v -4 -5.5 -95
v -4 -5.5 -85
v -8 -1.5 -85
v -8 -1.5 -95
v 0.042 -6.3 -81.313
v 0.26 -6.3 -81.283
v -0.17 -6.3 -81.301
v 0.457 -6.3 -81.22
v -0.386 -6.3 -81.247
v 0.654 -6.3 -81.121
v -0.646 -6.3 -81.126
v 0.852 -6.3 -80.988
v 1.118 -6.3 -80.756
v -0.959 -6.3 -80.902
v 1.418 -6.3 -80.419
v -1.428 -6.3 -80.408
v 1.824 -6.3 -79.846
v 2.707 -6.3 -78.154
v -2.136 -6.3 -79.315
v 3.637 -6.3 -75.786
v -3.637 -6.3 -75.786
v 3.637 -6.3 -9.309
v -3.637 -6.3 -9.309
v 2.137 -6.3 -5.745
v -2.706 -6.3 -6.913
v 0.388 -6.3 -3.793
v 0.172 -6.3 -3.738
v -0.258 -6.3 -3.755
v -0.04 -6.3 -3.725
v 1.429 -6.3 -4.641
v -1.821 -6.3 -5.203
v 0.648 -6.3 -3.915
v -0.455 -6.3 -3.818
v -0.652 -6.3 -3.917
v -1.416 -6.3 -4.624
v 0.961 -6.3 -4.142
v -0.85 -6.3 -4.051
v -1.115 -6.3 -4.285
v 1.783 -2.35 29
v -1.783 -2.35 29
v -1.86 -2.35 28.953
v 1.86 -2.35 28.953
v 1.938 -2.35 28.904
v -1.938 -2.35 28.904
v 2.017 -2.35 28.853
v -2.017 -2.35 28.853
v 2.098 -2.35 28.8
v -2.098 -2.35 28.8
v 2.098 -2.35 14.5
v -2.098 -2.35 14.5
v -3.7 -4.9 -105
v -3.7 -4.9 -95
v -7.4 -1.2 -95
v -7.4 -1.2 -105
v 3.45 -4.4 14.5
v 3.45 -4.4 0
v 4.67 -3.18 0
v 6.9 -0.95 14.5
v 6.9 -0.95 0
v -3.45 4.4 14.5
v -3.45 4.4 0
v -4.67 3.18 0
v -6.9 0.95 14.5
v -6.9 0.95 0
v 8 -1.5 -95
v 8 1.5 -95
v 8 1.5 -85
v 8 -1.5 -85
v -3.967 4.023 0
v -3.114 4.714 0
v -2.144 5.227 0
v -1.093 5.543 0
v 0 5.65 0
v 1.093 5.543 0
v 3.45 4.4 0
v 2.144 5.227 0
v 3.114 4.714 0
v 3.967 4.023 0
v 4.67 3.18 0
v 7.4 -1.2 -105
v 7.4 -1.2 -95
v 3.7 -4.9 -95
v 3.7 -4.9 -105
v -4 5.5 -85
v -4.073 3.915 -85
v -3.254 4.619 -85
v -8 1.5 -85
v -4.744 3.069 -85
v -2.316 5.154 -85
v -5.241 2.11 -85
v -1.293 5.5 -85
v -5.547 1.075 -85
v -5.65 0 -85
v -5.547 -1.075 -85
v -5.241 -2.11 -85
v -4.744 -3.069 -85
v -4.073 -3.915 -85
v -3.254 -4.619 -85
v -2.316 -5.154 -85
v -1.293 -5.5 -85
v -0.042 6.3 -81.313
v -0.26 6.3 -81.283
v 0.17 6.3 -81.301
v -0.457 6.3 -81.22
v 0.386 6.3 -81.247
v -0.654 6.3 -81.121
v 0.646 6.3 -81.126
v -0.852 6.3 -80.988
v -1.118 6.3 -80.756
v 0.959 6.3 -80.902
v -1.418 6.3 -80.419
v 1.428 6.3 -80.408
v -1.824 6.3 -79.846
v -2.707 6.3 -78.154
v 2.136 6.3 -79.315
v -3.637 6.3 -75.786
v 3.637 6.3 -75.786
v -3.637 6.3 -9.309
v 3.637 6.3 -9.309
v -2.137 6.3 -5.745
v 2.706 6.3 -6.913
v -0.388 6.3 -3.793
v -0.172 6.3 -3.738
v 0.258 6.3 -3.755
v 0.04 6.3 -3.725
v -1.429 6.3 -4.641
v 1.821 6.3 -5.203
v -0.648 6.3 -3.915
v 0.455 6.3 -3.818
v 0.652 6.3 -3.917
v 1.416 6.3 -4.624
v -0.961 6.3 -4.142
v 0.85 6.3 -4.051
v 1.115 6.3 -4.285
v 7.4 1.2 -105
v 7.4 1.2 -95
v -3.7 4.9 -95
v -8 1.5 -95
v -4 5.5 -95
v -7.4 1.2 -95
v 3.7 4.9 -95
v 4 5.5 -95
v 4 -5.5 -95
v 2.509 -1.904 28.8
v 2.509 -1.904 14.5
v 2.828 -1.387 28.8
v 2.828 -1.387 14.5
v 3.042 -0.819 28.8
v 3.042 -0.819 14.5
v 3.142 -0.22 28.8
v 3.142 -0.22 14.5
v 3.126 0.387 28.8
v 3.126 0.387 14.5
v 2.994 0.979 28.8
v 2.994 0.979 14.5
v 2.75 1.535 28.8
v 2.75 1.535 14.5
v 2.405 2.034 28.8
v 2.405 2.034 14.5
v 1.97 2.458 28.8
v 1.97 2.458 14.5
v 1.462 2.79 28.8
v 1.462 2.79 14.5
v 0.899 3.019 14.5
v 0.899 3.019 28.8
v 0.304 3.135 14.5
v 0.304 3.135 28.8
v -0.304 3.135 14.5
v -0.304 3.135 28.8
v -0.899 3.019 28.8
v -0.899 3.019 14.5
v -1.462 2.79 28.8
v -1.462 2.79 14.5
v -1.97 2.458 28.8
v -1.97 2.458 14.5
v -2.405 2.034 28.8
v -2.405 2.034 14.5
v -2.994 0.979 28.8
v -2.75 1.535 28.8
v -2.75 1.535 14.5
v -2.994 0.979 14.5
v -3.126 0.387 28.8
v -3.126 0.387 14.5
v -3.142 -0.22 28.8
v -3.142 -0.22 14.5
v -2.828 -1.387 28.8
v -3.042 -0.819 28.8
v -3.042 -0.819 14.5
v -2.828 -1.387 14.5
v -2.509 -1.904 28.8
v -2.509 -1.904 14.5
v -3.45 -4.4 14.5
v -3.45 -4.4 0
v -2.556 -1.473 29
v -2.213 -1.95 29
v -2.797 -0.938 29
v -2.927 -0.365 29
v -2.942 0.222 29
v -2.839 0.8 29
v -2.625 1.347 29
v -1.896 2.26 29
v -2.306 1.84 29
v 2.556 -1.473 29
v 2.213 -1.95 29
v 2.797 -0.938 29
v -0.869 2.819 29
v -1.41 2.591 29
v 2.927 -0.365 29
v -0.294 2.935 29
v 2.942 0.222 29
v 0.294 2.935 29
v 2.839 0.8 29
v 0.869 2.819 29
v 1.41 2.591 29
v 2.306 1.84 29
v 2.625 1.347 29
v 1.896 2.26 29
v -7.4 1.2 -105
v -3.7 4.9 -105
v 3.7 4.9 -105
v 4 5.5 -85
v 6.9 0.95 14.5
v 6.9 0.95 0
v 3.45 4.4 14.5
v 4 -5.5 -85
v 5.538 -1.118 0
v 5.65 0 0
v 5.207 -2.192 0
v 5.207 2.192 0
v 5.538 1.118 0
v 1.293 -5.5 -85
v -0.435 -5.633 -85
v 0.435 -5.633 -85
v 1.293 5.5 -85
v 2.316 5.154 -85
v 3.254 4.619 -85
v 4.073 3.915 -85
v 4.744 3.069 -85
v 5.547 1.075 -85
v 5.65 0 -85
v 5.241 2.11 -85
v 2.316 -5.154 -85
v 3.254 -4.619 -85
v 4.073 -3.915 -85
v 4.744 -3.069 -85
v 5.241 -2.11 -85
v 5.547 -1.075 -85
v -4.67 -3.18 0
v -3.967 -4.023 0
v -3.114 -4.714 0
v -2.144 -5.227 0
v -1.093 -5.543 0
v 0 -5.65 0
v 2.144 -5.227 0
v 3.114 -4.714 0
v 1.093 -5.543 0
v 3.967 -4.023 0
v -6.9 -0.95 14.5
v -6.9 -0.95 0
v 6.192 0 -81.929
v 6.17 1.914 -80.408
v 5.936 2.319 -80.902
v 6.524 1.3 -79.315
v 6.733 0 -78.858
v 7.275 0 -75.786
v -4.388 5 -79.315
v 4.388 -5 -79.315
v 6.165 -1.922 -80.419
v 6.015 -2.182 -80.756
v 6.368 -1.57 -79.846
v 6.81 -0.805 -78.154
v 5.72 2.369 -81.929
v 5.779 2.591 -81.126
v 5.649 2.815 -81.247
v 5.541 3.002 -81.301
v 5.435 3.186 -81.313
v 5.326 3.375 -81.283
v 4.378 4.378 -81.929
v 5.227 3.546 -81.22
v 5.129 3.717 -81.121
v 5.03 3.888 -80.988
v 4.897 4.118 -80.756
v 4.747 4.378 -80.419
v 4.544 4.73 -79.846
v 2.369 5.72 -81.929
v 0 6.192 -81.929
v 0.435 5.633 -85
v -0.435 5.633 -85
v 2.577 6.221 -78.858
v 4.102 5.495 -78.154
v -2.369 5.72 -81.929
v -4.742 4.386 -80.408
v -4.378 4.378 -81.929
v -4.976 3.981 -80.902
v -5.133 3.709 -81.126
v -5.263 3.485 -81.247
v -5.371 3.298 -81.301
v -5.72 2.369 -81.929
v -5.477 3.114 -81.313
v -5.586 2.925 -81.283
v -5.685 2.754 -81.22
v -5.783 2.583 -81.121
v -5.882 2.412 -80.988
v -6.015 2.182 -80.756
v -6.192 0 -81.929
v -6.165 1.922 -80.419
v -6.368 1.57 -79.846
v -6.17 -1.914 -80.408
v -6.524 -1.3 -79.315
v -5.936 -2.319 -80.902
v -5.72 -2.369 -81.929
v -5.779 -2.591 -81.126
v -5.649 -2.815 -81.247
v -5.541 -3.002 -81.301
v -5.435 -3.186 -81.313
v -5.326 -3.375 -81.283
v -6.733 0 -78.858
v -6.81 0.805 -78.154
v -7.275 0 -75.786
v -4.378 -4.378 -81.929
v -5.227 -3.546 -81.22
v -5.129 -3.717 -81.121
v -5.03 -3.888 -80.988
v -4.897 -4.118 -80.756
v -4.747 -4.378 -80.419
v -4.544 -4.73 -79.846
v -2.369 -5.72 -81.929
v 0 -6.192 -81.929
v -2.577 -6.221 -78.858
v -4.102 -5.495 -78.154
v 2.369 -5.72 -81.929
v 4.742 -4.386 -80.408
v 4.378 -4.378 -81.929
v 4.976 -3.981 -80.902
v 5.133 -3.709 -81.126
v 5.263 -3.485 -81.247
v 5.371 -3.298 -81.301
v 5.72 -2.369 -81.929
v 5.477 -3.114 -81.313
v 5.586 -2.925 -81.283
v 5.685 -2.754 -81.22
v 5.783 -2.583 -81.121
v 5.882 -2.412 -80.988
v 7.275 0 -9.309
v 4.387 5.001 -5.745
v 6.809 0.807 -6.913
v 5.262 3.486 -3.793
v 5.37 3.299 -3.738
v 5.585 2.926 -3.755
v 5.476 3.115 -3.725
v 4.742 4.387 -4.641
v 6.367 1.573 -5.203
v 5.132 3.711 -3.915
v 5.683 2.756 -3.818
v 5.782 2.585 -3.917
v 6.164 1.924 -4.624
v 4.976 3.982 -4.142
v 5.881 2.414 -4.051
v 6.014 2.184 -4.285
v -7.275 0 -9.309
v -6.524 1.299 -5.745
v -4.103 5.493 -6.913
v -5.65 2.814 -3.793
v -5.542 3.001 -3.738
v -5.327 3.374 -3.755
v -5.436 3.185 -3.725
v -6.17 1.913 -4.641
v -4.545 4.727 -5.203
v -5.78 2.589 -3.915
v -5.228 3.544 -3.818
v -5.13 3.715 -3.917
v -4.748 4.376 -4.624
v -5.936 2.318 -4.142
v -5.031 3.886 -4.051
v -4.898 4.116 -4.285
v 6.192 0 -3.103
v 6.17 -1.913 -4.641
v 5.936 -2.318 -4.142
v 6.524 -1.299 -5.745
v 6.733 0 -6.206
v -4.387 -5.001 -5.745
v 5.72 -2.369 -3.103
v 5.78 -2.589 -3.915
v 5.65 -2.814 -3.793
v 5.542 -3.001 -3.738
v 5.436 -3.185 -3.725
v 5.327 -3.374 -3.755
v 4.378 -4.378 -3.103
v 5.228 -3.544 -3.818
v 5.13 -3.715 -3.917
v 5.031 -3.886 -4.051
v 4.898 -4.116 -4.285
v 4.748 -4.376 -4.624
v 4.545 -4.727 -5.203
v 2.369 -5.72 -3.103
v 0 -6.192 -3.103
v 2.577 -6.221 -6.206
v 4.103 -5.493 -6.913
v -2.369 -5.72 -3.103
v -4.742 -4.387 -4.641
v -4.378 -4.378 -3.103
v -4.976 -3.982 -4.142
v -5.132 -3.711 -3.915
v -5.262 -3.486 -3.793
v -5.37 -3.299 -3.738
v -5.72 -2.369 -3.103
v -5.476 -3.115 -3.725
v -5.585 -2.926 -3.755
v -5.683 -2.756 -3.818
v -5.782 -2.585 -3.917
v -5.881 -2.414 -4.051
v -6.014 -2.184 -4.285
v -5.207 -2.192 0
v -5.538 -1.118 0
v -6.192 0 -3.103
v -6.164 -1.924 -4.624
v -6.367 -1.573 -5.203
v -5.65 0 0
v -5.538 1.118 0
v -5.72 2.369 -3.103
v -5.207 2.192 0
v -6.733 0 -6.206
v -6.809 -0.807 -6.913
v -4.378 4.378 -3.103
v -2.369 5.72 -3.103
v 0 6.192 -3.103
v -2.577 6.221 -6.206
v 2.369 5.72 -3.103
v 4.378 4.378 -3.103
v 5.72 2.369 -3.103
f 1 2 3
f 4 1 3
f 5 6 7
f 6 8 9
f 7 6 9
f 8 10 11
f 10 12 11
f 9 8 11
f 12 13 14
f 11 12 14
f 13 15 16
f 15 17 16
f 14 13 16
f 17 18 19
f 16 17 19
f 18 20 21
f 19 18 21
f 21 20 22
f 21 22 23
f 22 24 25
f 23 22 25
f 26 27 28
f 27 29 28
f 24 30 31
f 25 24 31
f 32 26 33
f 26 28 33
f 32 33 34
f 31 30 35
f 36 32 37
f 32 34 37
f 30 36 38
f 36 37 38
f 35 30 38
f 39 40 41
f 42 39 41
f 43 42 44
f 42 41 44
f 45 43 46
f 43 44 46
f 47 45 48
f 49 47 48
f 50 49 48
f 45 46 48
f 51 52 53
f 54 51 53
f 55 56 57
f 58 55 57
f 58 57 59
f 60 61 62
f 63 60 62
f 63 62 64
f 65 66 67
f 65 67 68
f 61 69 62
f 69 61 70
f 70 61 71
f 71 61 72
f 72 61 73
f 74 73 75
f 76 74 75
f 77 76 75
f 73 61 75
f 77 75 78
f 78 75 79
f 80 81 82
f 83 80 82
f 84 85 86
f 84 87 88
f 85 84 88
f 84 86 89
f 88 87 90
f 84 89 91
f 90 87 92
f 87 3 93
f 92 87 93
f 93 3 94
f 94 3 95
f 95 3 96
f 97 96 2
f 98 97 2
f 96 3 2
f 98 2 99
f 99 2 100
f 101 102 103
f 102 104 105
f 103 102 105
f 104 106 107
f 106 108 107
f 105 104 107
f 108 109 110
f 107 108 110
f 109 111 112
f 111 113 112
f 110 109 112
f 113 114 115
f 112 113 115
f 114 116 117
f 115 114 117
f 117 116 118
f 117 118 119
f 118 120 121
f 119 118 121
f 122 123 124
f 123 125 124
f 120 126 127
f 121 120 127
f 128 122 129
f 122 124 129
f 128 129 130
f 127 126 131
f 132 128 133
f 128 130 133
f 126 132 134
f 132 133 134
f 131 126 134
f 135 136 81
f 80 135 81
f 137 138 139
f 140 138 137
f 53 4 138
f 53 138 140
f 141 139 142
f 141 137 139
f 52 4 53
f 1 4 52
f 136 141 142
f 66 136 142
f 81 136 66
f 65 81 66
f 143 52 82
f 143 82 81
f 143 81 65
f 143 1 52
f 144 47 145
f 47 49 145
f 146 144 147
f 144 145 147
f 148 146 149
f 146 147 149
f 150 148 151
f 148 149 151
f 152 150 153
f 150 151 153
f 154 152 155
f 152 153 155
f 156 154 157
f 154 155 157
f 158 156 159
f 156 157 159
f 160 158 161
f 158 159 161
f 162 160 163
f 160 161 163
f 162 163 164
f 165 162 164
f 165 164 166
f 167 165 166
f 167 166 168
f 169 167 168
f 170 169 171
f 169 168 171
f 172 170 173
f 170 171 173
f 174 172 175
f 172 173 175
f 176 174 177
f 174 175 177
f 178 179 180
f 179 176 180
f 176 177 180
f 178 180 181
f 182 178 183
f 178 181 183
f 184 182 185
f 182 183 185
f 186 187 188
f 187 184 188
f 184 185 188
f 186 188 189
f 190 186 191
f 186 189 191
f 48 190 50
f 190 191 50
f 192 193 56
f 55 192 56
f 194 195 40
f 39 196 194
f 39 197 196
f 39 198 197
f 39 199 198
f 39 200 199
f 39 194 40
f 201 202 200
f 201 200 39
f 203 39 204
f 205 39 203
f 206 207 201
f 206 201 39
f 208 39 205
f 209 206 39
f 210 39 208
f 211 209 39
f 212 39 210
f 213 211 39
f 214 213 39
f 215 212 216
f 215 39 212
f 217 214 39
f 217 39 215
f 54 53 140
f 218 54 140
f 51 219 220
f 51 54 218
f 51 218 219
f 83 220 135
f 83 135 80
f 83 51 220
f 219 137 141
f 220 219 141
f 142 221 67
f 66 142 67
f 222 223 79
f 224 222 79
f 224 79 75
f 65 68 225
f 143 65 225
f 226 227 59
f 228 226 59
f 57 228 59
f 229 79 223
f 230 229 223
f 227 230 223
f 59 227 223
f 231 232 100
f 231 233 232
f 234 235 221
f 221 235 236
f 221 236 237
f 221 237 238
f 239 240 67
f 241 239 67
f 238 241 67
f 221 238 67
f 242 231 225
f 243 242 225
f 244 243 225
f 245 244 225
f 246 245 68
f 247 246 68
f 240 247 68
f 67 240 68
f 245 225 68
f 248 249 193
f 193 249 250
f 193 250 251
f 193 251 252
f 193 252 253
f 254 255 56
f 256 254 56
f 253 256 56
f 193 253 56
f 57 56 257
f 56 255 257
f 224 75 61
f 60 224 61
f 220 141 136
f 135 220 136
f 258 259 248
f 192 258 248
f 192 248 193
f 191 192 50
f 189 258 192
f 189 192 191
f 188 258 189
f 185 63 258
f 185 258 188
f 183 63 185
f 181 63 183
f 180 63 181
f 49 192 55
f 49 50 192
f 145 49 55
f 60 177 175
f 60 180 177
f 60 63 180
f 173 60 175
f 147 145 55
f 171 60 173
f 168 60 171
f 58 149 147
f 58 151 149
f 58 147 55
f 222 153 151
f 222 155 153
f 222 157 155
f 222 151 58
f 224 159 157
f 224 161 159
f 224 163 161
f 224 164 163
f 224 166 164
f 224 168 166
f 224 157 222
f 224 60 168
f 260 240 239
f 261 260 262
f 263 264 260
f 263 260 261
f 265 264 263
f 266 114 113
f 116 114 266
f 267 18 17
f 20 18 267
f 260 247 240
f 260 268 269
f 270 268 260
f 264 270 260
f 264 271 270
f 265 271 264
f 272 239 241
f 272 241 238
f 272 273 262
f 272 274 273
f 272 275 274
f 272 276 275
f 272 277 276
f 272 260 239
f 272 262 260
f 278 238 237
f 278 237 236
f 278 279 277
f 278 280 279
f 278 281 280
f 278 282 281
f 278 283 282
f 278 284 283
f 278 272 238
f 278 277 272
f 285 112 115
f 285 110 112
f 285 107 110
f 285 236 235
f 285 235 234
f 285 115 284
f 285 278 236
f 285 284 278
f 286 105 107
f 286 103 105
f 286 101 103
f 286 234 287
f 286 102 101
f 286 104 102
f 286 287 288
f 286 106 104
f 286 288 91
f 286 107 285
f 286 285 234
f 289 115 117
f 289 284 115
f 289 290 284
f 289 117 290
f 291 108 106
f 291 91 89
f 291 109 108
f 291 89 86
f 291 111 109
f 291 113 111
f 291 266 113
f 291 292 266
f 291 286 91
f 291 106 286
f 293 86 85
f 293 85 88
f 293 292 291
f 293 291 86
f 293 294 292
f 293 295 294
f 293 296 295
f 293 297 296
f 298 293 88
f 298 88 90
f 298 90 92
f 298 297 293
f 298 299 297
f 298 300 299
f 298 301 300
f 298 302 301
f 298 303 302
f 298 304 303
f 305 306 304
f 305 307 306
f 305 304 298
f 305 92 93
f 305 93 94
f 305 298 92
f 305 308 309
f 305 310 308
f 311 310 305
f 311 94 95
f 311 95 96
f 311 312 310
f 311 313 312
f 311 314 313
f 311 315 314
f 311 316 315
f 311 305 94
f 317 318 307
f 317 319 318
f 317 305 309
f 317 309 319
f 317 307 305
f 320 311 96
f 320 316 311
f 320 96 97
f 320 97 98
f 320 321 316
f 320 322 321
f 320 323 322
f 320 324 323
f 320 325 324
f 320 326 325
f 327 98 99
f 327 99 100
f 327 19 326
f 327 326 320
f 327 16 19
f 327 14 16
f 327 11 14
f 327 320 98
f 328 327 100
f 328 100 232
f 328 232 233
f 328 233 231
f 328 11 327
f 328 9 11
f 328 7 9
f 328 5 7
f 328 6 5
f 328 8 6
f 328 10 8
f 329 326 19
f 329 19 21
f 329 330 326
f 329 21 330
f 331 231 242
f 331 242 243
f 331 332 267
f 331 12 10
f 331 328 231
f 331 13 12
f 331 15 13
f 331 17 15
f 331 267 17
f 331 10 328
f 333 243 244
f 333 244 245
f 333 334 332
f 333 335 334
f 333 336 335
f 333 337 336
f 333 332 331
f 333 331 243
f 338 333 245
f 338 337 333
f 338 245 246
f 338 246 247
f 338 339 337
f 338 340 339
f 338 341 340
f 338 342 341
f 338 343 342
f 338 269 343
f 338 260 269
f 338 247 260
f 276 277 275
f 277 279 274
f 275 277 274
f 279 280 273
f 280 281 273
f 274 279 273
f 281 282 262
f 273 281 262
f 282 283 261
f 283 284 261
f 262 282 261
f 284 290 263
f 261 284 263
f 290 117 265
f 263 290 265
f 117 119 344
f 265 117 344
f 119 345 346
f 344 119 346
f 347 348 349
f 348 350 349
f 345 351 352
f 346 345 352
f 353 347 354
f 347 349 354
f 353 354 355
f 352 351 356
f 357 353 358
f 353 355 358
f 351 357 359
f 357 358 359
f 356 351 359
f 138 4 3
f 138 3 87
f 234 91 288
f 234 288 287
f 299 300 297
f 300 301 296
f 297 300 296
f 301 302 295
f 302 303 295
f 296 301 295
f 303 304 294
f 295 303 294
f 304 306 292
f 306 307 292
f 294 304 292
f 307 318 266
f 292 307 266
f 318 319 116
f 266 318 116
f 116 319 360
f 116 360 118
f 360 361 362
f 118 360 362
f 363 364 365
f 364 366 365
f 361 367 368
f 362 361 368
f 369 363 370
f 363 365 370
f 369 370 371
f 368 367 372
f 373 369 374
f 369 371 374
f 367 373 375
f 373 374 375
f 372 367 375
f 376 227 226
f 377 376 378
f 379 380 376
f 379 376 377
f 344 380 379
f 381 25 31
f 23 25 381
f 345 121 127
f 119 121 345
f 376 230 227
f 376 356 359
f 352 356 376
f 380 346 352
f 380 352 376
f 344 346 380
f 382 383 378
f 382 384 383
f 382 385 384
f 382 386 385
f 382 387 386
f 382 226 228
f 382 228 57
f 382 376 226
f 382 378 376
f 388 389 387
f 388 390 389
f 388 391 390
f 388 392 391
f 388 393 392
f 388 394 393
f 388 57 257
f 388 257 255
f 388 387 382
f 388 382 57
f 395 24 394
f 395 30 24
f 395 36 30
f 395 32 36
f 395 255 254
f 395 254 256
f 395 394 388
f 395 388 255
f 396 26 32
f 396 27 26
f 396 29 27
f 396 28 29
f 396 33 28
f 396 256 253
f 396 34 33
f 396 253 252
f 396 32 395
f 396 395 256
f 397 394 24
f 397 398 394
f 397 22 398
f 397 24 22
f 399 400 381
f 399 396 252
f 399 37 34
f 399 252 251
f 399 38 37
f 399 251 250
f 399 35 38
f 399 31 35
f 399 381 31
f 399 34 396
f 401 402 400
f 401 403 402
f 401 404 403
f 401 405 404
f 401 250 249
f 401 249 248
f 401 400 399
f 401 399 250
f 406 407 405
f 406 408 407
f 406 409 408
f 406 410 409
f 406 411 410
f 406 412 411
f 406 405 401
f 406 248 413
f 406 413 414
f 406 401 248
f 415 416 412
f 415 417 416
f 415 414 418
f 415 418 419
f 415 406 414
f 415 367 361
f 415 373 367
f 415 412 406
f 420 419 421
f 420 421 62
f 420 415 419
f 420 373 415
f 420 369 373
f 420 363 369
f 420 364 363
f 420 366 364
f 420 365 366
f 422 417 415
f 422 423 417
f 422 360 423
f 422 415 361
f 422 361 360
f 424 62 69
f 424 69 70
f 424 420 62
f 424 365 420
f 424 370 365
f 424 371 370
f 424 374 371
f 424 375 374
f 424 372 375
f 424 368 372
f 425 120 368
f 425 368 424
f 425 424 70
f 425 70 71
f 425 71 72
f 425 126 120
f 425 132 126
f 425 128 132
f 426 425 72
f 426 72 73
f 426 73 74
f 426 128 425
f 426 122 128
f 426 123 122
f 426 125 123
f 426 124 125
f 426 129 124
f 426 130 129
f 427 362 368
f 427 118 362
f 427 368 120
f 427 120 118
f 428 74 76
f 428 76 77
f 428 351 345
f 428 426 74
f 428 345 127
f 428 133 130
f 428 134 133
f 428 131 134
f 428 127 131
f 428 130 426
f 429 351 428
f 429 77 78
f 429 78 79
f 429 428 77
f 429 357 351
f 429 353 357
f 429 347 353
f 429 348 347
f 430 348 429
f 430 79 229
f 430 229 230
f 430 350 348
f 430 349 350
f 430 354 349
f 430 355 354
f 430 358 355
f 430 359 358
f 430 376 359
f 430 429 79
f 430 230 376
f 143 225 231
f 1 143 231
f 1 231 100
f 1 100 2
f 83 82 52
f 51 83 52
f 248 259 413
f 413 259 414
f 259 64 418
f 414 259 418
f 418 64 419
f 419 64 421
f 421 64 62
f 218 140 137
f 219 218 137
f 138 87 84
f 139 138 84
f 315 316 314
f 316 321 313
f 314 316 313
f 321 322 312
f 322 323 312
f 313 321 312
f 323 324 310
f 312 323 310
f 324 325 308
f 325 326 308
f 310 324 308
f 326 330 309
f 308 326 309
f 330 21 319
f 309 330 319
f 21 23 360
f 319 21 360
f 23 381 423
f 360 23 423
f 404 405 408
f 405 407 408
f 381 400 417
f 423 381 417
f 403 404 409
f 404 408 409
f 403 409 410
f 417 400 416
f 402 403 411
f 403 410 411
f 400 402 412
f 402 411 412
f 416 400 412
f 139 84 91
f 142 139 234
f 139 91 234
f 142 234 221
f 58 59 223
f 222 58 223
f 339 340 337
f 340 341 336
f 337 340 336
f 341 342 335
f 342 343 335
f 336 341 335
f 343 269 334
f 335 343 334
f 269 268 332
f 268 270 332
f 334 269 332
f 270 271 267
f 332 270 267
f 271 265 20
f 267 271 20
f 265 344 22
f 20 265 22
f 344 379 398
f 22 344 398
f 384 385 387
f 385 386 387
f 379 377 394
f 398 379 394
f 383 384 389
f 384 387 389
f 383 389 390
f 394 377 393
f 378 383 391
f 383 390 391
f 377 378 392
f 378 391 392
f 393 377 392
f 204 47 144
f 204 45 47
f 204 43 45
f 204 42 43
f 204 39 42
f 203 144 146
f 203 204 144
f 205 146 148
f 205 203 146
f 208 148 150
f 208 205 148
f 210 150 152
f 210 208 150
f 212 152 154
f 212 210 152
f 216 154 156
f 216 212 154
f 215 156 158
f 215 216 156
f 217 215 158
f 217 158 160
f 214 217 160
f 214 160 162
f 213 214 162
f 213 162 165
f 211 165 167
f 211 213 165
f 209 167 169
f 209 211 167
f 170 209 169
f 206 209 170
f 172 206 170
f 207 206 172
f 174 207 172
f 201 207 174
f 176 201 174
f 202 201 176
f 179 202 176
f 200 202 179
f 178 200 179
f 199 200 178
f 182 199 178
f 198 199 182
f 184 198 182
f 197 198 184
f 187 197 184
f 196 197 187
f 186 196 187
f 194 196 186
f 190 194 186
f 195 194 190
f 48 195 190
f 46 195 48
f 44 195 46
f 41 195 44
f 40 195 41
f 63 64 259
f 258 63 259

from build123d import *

# Parameters (mm, degrees)
F1_DEPTH  = 14.5
F2_R      = 3.15
F3_DEPTH  = 14.5
F4_SIZE   = 0.2
F5_W      = 3.287728643
F5_H      = 0.8
F5_W_2    = 2.4924869649
F6_DEPTH  = 14.5
F8_DEPTH  = 85
F9_R      = 16.1404886934
F9_R_2    = 5.65
F10_DEPTH = 10
F10_TAPER = 9.9
F11_R     = 17.5534972963
F11_R_2   = 5.65
F12_DEPTH = 25
F12_TAPER = 10
F14_DEPTH = 10
F16_DEPTH = 10


with BuildPart() as f1:
    # F0 (on Top) → F1 (new body)
    with BuildSketch(Plane.XY):
        Polygon((-3.45, -4.4), (0, -4.4), (3.45, -4.4), (6.9, -0.95), (6.9, 0.95), (3.45, 4.4), (-3.45, 4.4), (-6.9, 0.95), (-6.9, -0.95), align=None)
    extrude(amount=F1_DEPTH)

    # F2 (on face) → F3 (join)
    with BuildSketch(Plane.XY.offset(14.5)):
        Circle(F2_R)
    extrude(amount=F3_DEPTH)

    # F4
    f4_edges = [f1.edges().sort_by_distance(p)[0] for p in [
        (-3.15, 0, 29),
    ]]
    chamfer(f4_edges, length=F4_SIZE)

    # F5 (on face) → F6 (cut)
    with BuildSketch(Plane.XY.offset(29)):
        with Locations((1.6438643215, -2.75)):
            Rectangle(F5_W, F5_H)
        with Locations((-1.2462434825, -2.75)):
            Rectangle(F5_W_2, F5_H)
    extrude(amount=-F6_DEPTH, mode=Mode.SUBTRACT)

    # F7 (on face) → F8 (join)
    with BuildSketch(Plane(origin=(0, 0, 0), x_dir=(1, 0, 0), z_dir=(0, 0, -1))):
        Polygon((3.6373066959, -6.3), (7.2746133918, 0), (3.6373066959, 6.3), (-3.6373066959, 6.3), (-7.2746133918, 0), (-3.6373066959, -6.3), align=None)
    extrude(amount=F8_DEPTH)

    # F9 (on face) → F10 (cut)
    with BuildSketch(Plane.XY):
        Circle(F9_R)
        Circle(F9_R_2, mode=Mode.SUBTRACT)
    extrude(amount=-F10_DEPTH, taper=F10_TAPER, mode=Mode.SUBTRACT)

    # F11 (on face) → F12 (cut)
    with BuildSketch(Plane(origin=(0, 0, -85), x_dir=(1, 0, 0), z_dir=(0, 0, -1))):
        Circle(F11_R)
        Circle(F11_R_2, mode=Mode.SUBTRACT)
    extrude(amount=-F12_DEPTH, taper=F12_TAPER, mode=Mode.SUBTRACT)

    # F13 (on face) → F14 (join)
    with BuildSketch(Plane(origin=(0, 0, -85), x_dir=(1, 0, 0), z_dir=(0, 0, -1))):
        Polygon((-4, -5.5), (0, -5.5), (4, -5.5), (8, -1.5), (8, 0), (8, 1.5), (4, 5.5), (0, 5.5), (-4, 5.5), (-8, 1.5), (-8, 0), (-8, -1.5), align=None)
    extrude(amount=F14_DEPTH)

    # F15 (on face) → F16 (join)
    with BuildSketch(Plane(origin=(0, 0, -95), x_dir=(1, 0, 0), z_dir=(0, 0, -1))):
        Polygon((-3.7, -4.9), (0, -4.9), (3.7, -4.9), (7.4, -1.2), (7.4, 0), (7.4, 1.2), (3.7, 4.9), (0, 4.9), (-3.7, 4.9), (-7.4, 1.2), (-7.4, 0), (-7.4, -1.2), align=None)
    extrude(amount=F16_DEPTH)


solid = f1.part
